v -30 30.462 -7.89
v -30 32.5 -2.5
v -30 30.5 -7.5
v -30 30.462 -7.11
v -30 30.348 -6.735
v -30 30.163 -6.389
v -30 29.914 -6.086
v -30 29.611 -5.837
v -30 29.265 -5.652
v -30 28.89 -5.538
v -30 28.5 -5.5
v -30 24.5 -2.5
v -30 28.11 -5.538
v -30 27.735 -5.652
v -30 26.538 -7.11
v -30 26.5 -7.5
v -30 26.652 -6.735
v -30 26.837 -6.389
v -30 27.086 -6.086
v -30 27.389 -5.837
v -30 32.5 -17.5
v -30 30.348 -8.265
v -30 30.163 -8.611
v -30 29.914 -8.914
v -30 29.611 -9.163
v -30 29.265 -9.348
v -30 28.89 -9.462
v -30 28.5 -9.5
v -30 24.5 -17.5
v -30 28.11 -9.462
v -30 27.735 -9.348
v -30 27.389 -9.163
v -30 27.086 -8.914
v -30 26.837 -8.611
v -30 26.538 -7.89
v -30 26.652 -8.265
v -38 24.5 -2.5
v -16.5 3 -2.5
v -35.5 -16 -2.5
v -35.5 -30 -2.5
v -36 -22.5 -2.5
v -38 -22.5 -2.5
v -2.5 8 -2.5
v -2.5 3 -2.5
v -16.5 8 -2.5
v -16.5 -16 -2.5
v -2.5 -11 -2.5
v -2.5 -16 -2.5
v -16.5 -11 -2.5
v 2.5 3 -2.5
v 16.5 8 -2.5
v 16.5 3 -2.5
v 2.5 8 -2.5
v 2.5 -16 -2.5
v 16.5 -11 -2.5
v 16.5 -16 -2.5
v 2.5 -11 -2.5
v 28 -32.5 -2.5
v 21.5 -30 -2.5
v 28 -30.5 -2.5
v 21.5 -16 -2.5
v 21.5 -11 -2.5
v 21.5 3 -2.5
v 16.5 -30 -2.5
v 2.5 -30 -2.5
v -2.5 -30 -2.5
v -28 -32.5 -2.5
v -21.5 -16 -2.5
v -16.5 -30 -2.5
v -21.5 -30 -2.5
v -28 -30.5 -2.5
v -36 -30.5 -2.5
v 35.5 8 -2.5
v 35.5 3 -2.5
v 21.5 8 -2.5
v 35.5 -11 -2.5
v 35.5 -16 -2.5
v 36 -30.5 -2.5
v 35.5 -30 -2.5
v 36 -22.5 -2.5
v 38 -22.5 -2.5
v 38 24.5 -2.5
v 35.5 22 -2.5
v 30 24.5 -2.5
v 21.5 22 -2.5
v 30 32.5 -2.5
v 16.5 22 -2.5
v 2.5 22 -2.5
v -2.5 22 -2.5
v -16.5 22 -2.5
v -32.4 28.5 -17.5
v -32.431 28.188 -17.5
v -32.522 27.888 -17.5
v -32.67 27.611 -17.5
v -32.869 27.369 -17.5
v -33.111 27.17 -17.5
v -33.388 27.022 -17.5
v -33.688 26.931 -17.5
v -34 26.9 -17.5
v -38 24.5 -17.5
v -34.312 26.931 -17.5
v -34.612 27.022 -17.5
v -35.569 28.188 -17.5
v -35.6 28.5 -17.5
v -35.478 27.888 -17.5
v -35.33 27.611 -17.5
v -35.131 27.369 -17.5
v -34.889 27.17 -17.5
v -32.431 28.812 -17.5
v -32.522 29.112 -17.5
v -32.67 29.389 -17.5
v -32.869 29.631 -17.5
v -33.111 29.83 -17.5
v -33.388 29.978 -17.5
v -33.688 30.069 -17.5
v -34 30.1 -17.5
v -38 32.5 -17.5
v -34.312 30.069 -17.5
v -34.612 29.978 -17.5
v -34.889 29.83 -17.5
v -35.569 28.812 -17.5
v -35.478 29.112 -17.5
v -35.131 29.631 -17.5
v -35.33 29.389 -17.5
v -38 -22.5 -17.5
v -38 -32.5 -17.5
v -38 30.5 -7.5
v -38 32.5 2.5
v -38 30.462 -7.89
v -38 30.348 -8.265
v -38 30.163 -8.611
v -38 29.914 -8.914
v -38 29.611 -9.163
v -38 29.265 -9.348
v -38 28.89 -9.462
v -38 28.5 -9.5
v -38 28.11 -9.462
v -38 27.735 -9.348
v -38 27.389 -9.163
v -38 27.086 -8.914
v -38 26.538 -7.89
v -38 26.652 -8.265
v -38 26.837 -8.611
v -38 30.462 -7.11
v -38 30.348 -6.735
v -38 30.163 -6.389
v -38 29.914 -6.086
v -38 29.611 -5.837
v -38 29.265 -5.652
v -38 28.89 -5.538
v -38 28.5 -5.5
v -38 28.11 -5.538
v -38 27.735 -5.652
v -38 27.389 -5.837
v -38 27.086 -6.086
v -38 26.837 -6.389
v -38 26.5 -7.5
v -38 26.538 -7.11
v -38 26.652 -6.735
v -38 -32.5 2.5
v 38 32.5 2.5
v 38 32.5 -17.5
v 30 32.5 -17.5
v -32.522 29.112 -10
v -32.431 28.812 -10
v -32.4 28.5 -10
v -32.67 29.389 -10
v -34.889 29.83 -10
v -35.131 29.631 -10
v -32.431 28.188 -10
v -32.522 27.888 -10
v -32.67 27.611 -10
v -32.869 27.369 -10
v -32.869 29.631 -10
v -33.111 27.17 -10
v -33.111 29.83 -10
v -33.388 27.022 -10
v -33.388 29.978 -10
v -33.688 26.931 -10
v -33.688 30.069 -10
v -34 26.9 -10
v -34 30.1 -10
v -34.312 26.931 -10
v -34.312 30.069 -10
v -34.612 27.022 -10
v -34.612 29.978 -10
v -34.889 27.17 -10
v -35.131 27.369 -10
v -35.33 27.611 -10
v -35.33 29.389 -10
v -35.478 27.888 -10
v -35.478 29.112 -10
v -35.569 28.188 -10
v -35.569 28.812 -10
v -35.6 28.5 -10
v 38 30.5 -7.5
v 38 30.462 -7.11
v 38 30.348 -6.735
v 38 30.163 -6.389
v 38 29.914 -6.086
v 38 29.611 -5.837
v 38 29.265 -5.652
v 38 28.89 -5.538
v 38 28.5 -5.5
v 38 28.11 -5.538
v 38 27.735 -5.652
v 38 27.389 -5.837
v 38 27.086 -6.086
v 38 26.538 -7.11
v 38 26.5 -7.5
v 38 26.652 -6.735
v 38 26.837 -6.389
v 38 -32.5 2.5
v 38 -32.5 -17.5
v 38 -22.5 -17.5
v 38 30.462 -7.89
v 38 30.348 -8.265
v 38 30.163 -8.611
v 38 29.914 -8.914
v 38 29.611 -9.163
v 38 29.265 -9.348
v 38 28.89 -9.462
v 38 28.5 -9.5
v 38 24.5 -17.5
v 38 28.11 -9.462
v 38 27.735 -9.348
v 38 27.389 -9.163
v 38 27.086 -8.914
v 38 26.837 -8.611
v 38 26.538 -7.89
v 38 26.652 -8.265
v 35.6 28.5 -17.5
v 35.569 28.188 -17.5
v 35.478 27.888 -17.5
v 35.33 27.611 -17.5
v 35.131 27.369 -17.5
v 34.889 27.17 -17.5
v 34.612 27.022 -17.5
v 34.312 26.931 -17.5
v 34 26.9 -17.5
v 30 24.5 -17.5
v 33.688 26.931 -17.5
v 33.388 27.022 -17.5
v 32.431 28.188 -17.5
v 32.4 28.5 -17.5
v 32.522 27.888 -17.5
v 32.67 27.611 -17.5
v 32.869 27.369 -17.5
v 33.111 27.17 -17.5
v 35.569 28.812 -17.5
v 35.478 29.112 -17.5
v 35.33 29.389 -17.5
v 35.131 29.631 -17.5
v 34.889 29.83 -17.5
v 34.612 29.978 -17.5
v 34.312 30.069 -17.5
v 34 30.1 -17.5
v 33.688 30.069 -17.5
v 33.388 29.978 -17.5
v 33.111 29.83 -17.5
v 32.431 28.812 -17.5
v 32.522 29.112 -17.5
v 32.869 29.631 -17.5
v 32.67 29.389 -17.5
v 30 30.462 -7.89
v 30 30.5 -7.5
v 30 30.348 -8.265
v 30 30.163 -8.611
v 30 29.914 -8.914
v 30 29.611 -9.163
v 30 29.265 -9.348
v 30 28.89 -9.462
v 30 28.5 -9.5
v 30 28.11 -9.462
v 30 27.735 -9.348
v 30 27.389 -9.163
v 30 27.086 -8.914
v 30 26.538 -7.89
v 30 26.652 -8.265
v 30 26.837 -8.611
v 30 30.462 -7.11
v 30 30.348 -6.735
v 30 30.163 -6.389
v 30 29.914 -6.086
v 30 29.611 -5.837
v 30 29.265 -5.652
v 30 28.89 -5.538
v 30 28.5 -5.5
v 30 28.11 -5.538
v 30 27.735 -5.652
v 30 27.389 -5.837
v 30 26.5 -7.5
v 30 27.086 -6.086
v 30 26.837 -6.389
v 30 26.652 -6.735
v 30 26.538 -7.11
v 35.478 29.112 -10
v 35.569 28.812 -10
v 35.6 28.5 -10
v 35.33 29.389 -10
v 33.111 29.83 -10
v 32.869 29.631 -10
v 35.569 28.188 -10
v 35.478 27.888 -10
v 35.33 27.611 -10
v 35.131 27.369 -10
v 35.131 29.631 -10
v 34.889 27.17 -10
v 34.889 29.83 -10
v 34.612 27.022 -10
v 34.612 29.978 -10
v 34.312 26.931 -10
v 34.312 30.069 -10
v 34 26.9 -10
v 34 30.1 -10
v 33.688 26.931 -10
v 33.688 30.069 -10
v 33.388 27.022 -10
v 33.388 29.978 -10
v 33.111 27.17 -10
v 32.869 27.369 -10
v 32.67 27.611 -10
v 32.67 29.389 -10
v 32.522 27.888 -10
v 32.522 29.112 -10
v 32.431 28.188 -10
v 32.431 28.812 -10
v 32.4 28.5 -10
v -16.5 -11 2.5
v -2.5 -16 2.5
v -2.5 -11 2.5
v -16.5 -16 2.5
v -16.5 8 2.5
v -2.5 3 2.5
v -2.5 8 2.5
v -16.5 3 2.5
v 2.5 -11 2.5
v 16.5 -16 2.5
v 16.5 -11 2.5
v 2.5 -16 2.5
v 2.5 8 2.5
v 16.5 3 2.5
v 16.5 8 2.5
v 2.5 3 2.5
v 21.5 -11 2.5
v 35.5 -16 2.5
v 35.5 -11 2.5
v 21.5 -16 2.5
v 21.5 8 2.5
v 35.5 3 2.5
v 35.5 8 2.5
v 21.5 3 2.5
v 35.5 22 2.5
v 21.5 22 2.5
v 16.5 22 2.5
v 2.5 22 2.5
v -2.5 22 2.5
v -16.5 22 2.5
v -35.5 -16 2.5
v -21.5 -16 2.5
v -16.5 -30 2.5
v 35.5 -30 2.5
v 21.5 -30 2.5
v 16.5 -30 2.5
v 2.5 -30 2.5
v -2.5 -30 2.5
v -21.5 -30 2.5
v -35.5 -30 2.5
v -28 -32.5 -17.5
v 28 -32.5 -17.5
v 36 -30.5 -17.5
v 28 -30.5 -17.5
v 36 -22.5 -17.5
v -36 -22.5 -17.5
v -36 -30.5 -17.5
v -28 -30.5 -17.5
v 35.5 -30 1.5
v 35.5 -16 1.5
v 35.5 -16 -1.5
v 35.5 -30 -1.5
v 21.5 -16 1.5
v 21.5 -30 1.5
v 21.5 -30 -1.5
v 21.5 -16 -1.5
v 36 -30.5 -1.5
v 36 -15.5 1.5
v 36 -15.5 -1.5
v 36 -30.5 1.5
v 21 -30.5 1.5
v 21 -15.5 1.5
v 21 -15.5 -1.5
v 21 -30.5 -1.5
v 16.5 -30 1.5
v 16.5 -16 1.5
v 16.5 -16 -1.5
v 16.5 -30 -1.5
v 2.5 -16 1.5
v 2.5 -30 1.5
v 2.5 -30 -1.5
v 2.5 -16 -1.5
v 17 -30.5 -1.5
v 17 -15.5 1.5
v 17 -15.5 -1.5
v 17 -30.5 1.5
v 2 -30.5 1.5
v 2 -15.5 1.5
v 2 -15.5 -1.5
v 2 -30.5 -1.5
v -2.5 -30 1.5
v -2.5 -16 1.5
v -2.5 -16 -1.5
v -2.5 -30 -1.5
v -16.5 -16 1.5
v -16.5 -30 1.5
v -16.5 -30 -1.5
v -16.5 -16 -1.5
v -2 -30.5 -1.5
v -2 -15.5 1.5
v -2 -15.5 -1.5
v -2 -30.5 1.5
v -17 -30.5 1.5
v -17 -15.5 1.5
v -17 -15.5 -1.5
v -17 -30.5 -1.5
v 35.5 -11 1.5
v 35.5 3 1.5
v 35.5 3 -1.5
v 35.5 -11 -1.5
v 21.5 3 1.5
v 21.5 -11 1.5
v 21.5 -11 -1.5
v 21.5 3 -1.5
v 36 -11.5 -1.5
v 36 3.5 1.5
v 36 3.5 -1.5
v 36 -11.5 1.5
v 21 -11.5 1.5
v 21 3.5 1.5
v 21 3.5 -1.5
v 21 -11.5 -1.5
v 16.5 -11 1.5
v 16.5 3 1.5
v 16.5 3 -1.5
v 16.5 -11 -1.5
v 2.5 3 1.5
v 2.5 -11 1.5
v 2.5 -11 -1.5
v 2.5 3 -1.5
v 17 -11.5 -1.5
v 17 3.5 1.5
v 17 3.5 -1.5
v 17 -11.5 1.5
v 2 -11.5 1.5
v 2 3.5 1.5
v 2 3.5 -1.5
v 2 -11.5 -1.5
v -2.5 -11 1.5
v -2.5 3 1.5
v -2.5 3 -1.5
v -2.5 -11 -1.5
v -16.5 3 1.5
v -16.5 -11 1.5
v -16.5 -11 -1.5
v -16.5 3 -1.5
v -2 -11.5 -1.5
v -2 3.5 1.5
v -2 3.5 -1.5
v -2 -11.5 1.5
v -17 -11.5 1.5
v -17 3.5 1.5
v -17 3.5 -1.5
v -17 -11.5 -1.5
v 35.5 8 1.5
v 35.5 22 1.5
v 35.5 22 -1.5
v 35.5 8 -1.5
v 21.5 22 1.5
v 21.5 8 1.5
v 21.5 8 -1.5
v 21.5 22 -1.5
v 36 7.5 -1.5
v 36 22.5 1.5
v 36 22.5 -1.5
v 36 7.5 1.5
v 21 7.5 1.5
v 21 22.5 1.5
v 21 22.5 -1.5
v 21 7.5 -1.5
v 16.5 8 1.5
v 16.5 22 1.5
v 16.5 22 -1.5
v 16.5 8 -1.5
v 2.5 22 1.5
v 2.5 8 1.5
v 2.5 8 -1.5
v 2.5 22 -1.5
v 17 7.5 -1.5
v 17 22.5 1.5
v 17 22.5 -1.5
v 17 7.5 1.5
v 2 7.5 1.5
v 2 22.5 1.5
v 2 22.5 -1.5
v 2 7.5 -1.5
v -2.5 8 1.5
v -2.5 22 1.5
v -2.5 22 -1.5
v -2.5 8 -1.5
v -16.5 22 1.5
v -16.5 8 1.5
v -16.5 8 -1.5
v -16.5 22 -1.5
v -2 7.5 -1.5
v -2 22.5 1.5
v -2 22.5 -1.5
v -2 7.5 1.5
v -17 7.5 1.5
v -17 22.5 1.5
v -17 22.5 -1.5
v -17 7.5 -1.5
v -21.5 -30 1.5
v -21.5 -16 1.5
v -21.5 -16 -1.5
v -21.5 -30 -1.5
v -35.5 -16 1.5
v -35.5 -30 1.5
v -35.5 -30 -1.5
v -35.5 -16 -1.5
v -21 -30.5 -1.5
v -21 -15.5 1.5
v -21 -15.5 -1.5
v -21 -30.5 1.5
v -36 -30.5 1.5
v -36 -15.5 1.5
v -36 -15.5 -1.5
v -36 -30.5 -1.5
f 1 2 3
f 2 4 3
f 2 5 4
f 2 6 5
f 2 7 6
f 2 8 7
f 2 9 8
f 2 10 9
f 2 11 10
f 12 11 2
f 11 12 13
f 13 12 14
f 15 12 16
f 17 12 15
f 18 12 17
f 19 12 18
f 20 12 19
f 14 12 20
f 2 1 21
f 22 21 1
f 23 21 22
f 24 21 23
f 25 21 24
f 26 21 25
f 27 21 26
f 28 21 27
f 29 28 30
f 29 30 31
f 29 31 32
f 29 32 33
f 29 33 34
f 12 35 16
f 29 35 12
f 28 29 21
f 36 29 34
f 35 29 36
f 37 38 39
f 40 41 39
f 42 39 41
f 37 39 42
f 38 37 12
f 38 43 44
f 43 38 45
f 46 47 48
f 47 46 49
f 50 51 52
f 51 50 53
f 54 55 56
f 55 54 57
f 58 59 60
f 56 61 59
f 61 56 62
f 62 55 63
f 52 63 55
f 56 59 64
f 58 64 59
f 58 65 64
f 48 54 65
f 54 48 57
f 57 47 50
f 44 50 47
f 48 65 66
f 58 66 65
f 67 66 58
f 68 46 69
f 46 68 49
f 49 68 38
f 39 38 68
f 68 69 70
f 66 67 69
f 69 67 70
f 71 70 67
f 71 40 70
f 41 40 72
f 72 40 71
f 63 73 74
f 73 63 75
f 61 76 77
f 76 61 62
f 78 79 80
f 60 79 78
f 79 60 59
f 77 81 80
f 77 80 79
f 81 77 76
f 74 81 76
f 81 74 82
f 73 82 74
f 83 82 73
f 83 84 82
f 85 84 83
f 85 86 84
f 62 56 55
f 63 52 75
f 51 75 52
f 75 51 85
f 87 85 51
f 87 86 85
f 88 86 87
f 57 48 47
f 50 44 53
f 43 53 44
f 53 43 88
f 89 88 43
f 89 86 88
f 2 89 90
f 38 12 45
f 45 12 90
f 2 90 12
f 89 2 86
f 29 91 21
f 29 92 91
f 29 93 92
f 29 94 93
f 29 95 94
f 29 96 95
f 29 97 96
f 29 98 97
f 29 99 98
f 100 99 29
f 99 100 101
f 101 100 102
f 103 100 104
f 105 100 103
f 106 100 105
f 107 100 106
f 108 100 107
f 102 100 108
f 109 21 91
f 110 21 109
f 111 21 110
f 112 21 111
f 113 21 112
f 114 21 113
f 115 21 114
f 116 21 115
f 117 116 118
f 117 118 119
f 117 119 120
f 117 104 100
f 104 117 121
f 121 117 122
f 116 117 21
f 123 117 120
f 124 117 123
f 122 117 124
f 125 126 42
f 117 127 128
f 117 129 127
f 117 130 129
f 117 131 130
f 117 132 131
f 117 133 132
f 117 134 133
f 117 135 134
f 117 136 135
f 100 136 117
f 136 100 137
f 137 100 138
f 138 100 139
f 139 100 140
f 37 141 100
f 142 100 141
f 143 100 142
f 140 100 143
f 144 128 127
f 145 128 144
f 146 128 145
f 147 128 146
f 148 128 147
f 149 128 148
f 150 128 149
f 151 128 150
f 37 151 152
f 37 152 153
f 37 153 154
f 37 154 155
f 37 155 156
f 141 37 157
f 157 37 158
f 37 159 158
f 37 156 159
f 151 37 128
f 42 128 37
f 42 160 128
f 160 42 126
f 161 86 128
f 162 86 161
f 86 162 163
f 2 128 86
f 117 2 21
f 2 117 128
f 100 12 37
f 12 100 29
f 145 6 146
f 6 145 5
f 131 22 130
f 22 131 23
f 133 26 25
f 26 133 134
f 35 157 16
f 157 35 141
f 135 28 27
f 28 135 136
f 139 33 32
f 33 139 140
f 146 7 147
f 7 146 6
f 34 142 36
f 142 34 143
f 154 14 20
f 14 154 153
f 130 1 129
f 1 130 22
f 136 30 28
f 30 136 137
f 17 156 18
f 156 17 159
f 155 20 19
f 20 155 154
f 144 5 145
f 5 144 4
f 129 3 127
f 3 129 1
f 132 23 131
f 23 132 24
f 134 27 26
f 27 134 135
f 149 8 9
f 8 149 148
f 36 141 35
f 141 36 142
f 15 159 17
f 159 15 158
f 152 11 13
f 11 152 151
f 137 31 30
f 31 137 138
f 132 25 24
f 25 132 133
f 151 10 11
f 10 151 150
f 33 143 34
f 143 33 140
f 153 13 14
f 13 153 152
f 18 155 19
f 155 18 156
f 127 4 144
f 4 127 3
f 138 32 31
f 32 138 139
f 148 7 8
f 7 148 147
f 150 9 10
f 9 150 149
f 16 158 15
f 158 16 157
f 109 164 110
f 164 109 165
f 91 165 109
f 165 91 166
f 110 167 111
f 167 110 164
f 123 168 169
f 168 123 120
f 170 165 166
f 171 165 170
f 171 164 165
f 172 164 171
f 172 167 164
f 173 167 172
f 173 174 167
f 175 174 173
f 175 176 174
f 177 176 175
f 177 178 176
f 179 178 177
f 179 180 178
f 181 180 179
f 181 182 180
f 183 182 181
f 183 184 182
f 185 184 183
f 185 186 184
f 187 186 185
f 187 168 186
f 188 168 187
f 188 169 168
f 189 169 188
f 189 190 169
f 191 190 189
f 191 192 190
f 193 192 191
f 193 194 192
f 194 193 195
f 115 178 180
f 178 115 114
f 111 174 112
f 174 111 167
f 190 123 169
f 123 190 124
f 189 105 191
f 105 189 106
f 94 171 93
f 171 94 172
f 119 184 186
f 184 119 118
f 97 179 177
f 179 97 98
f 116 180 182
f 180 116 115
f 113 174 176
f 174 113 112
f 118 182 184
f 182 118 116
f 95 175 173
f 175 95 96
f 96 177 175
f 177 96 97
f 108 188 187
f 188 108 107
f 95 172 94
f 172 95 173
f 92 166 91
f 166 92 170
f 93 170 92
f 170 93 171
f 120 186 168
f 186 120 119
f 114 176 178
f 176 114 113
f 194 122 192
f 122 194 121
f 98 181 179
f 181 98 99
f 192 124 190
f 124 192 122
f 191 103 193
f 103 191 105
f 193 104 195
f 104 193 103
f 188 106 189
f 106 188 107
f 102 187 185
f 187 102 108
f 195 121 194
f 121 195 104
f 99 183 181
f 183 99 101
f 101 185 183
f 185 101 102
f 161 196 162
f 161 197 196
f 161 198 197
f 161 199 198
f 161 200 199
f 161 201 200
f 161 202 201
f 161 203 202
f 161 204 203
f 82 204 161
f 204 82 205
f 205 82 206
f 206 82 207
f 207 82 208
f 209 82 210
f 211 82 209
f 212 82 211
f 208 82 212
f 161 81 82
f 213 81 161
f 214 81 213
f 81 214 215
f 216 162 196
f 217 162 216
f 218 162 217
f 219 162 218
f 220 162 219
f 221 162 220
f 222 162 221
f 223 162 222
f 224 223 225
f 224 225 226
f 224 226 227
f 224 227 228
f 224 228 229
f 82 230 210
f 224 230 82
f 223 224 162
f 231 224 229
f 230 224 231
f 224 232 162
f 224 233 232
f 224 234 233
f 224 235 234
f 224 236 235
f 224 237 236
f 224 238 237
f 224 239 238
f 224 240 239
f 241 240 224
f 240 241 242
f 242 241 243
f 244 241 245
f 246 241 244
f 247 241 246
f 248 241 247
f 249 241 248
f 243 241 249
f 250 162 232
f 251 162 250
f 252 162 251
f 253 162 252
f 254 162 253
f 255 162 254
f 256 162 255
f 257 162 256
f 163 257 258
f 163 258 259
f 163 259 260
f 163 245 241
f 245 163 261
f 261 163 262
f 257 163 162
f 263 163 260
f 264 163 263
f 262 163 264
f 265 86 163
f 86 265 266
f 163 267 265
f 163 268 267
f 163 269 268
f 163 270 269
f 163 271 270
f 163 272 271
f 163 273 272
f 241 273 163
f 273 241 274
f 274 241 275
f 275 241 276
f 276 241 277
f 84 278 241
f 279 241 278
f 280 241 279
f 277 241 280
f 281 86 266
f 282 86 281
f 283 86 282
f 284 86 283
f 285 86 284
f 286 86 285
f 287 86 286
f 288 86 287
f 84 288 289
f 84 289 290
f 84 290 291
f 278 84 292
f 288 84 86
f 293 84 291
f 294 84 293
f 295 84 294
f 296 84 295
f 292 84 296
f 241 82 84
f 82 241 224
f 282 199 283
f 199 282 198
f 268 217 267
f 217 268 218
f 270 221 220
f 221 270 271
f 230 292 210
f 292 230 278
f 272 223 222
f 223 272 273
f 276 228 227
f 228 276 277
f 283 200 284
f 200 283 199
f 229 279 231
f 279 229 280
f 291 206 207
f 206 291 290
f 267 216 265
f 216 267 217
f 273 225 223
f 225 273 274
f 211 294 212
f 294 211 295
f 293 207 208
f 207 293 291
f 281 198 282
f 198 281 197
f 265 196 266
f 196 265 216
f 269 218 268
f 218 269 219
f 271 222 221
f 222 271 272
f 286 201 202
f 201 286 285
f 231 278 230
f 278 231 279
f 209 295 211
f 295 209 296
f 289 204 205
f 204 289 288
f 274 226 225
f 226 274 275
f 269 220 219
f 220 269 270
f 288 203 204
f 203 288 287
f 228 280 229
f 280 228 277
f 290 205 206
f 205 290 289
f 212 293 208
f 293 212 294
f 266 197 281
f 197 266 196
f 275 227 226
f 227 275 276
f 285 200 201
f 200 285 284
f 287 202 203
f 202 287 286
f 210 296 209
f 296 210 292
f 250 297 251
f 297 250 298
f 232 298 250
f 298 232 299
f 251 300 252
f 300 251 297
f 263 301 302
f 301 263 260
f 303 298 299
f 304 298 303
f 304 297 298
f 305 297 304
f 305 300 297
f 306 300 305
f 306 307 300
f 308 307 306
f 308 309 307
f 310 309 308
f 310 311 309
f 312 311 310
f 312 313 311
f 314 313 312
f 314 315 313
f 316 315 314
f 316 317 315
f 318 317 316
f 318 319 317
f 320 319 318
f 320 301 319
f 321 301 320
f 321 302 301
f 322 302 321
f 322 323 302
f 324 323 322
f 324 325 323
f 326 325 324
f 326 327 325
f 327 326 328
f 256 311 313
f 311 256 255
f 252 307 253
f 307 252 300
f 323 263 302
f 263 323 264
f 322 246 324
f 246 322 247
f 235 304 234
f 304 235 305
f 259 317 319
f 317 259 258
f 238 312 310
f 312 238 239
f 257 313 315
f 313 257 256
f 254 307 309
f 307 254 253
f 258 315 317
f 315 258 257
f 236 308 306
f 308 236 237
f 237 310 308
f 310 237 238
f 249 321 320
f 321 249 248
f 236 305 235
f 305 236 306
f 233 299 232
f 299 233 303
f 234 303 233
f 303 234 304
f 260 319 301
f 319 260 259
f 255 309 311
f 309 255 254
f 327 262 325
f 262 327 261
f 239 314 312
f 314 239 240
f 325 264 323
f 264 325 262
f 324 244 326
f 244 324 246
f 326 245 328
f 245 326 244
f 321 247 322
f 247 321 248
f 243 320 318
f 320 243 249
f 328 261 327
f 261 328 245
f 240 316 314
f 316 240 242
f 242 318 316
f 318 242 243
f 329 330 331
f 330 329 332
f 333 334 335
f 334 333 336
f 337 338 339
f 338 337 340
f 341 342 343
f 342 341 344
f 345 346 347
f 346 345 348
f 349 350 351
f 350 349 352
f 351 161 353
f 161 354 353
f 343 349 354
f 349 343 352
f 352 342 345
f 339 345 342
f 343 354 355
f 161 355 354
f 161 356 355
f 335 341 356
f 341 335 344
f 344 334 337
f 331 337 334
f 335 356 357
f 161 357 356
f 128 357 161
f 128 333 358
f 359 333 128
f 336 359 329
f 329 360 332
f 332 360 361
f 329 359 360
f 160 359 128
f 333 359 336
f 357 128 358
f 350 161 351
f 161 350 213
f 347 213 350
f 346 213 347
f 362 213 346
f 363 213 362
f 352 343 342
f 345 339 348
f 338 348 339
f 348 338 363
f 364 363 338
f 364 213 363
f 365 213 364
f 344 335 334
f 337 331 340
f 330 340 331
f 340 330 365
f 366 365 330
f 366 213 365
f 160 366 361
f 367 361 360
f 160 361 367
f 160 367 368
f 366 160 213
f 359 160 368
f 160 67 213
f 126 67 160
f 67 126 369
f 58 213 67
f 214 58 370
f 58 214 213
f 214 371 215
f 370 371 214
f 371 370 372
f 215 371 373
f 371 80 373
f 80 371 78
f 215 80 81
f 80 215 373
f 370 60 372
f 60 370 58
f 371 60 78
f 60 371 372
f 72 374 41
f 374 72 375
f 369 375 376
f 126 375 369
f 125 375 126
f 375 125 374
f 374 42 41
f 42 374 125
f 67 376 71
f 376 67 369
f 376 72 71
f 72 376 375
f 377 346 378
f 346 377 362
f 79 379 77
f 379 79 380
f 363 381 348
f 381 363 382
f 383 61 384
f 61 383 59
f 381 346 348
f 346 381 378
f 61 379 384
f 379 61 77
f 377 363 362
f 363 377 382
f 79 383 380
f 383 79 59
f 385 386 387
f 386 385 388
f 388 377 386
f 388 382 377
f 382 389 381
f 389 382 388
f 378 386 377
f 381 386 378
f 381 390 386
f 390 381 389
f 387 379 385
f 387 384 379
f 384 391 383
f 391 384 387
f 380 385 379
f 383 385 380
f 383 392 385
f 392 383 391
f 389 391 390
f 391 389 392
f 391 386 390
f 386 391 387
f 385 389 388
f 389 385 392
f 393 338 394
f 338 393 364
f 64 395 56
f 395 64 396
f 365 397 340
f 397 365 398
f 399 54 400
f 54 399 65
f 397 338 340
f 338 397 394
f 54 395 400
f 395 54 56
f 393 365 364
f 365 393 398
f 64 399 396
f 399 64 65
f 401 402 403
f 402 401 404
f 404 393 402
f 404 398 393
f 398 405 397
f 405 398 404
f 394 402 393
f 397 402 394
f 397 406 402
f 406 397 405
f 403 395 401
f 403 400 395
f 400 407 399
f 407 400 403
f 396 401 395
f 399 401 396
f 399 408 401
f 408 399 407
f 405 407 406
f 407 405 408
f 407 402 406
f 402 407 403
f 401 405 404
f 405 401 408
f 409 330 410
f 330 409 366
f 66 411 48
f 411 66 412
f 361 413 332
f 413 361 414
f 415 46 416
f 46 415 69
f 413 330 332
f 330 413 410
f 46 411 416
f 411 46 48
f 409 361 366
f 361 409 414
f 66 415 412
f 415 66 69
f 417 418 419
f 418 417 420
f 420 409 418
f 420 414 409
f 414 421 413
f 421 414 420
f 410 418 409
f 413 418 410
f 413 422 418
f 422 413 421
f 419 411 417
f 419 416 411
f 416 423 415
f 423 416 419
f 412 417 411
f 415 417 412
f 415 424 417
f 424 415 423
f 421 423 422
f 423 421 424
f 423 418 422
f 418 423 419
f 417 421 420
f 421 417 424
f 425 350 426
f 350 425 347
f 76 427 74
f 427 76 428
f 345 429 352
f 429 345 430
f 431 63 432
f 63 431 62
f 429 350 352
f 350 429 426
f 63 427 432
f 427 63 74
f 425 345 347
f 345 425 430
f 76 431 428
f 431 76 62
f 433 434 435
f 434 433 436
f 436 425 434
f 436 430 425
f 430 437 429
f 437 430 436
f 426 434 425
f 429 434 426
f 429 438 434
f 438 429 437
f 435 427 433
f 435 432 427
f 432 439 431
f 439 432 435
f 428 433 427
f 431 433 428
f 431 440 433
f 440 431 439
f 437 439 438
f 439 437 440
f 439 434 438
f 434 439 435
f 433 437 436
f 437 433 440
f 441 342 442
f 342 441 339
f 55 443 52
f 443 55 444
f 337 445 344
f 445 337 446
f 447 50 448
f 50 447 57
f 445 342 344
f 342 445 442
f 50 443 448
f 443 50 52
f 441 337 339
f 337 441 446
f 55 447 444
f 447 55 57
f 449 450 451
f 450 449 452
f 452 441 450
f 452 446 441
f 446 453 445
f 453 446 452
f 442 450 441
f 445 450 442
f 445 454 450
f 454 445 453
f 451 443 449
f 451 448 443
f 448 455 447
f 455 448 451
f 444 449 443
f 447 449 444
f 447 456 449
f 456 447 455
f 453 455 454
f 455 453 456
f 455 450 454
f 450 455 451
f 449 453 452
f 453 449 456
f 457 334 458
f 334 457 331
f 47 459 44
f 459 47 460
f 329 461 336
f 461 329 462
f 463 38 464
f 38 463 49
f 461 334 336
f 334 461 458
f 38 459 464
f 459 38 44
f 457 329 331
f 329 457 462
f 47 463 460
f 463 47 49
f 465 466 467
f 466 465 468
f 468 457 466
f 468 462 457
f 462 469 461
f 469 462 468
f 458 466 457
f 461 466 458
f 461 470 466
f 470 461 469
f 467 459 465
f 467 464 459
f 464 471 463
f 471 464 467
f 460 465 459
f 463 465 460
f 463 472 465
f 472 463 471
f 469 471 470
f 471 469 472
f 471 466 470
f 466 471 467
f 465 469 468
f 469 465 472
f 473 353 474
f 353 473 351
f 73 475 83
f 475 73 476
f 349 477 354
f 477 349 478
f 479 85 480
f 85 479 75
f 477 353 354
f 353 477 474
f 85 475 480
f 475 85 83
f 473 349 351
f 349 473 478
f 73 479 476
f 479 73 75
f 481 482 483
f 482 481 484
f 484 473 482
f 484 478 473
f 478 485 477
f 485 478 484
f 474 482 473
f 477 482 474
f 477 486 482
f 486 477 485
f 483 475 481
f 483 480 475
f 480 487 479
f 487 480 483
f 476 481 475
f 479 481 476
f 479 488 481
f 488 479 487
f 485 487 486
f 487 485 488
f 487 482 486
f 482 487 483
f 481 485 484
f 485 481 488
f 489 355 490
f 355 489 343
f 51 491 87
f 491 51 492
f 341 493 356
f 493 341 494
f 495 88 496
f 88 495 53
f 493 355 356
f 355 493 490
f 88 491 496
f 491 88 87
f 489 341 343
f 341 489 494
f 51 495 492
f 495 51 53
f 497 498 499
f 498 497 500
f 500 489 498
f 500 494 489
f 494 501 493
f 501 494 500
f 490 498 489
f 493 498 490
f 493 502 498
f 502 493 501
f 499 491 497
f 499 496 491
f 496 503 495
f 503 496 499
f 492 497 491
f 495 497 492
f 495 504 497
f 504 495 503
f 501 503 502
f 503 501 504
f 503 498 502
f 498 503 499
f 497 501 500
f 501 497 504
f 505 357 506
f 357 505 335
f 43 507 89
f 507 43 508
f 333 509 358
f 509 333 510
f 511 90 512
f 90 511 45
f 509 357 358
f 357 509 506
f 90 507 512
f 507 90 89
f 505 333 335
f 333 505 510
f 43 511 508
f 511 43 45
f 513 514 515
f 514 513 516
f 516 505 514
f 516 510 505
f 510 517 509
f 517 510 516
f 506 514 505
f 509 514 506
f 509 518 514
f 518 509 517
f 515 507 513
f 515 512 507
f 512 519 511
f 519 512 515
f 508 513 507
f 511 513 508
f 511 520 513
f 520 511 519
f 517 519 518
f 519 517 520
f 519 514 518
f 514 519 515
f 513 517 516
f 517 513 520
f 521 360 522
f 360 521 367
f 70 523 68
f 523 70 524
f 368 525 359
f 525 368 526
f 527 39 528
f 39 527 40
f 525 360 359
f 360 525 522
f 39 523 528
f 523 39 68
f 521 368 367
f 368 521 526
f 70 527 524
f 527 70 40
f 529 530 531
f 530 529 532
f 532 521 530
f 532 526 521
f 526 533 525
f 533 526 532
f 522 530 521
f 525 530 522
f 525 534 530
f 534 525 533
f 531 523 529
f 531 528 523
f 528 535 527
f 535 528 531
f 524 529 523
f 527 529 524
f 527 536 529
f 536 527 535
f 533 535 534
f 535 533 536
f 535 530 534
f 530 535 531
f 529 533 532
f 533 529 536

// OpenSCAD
// file: common.scad
key_size = 14;
stabilizer_size = 3.5;

b_post = 8;
m_post_s = 2;
m_post_l = 10;
post_z = 15;

plat_z = 5;

module keyhole(x, y) {
  translate([x, y, 0]) {
    cube([key_size, key_size, plat_z + 1], center = true);
    cube([key_size + 1, key_size + 1, plat_z - 2], center = true);
  }
}

module double_wide(x, y) {
  keyhole(x, y);
  for (offset=[-12, 12]) {
     translate([x + offset, y - 1, 0]) {
       cube([stabilizer_size, key_size, plat_z + 1], center = true);
       translate([0, key_size/2, 0])
         cube([stabilizer_size, 1, plat_z - 2], center = true);
       translate([0, -key_size/2, 0])
         cube([stabilizer_size, 2, plat_z - 2], center = true);
     }
  }
}

module e_post(x, y, z) {
  translate([x, y, -(plat_z + post_z)/2]) {
    difference() {
      cube([b_post, b_post, post_z], center = true);
      translate([0, 0, -post_z/2]) cylinder(h=post_z, r=1.6, center=true, $fn=32);
    }
  }
}

module e_post_i(x, y, r) {
  translate([x, y, -(plat_z + post_z)/2]) {
    difference() {
      cube([b_post, b_post, post_z], center = true);
      translate([0, 0, post_z/6]) rotate(r) cylinder(h=b_post+1, r=2, center=true, $fn=32);
      translate([0, 0, -post_z/2]) cylinder(h=post_z, r=1.6, center=true, $fn=32);
    }
  }
}

module e_post_x(x, y) {
  e_post_i(x, y, [0, 90, 0]);
}


module e_post_y(x, y) {
  e_post_i(x, y, [90, 0, 0]);
}

module i_post_x(x, y) {
  translate([x, y, -(plat_z + post_z)/2]) cube([m_post_l, m_post_s, post_z], center = true);
}

module i_post_y(x, y) {
  translate([x, y, -(plat_z + post_z)/2]) cube([m_post_s, m_post_l, post_z], center = true);
}
// file: parameters.scad
key_size = 14;
key_sep = 5;
m_key_sep = 13.5;
l_key_sep = 33;

border = 8;
b_post = 8;
m_post_s = 2;
m_post_l = 10;
post_z = 15;

key_cell = key_size + key_sep;
m_key_cell_x = key_size + m_key_sep;
l_key_cell_x = 2*key_cell;

plat_z = 5;
// main file
// Alien bat section 3: top middle right section

include <parameters.scad>

plat_x = 4 * key_cell;
plat_y = 3 * key_cell + border;

use <common.scad>

difference() {
  union() {
    cube([plat_x, plat_y, 5], center = true);
    e_post_x(-(plat_x-b_post)/2, (plat_y-b_post)/2);
    e_post_x((plat_x-b_post)/2, (plat_y-b_post)/2);

    i_post_y((plat_x-m_post_s)/2, -(plat_y-m_post_l)/2);
    i_post_x((plat_x-m_post_l)/2, -(plat_y-m_post_s)/2);

    i_post_y(-(plat_x-m_post_s)/2, -(plat_y-m_post_l)/2);
    i_post_x(-(plat_x-m_post_l)/2, -(plat_y-m_post_s)/2);

  }
  for (row = [0:2]) {
    for (col = [0:2]) {
      keyhole(plat_x/2 - key_cell/2 - col * key_cell, -plat_y/2 + row*key_cell + key_cell/2);
    }
  }
  keyhole(-plat_x/2 + key_cell/2, -plat_y/2 + key_cell/2);
}
